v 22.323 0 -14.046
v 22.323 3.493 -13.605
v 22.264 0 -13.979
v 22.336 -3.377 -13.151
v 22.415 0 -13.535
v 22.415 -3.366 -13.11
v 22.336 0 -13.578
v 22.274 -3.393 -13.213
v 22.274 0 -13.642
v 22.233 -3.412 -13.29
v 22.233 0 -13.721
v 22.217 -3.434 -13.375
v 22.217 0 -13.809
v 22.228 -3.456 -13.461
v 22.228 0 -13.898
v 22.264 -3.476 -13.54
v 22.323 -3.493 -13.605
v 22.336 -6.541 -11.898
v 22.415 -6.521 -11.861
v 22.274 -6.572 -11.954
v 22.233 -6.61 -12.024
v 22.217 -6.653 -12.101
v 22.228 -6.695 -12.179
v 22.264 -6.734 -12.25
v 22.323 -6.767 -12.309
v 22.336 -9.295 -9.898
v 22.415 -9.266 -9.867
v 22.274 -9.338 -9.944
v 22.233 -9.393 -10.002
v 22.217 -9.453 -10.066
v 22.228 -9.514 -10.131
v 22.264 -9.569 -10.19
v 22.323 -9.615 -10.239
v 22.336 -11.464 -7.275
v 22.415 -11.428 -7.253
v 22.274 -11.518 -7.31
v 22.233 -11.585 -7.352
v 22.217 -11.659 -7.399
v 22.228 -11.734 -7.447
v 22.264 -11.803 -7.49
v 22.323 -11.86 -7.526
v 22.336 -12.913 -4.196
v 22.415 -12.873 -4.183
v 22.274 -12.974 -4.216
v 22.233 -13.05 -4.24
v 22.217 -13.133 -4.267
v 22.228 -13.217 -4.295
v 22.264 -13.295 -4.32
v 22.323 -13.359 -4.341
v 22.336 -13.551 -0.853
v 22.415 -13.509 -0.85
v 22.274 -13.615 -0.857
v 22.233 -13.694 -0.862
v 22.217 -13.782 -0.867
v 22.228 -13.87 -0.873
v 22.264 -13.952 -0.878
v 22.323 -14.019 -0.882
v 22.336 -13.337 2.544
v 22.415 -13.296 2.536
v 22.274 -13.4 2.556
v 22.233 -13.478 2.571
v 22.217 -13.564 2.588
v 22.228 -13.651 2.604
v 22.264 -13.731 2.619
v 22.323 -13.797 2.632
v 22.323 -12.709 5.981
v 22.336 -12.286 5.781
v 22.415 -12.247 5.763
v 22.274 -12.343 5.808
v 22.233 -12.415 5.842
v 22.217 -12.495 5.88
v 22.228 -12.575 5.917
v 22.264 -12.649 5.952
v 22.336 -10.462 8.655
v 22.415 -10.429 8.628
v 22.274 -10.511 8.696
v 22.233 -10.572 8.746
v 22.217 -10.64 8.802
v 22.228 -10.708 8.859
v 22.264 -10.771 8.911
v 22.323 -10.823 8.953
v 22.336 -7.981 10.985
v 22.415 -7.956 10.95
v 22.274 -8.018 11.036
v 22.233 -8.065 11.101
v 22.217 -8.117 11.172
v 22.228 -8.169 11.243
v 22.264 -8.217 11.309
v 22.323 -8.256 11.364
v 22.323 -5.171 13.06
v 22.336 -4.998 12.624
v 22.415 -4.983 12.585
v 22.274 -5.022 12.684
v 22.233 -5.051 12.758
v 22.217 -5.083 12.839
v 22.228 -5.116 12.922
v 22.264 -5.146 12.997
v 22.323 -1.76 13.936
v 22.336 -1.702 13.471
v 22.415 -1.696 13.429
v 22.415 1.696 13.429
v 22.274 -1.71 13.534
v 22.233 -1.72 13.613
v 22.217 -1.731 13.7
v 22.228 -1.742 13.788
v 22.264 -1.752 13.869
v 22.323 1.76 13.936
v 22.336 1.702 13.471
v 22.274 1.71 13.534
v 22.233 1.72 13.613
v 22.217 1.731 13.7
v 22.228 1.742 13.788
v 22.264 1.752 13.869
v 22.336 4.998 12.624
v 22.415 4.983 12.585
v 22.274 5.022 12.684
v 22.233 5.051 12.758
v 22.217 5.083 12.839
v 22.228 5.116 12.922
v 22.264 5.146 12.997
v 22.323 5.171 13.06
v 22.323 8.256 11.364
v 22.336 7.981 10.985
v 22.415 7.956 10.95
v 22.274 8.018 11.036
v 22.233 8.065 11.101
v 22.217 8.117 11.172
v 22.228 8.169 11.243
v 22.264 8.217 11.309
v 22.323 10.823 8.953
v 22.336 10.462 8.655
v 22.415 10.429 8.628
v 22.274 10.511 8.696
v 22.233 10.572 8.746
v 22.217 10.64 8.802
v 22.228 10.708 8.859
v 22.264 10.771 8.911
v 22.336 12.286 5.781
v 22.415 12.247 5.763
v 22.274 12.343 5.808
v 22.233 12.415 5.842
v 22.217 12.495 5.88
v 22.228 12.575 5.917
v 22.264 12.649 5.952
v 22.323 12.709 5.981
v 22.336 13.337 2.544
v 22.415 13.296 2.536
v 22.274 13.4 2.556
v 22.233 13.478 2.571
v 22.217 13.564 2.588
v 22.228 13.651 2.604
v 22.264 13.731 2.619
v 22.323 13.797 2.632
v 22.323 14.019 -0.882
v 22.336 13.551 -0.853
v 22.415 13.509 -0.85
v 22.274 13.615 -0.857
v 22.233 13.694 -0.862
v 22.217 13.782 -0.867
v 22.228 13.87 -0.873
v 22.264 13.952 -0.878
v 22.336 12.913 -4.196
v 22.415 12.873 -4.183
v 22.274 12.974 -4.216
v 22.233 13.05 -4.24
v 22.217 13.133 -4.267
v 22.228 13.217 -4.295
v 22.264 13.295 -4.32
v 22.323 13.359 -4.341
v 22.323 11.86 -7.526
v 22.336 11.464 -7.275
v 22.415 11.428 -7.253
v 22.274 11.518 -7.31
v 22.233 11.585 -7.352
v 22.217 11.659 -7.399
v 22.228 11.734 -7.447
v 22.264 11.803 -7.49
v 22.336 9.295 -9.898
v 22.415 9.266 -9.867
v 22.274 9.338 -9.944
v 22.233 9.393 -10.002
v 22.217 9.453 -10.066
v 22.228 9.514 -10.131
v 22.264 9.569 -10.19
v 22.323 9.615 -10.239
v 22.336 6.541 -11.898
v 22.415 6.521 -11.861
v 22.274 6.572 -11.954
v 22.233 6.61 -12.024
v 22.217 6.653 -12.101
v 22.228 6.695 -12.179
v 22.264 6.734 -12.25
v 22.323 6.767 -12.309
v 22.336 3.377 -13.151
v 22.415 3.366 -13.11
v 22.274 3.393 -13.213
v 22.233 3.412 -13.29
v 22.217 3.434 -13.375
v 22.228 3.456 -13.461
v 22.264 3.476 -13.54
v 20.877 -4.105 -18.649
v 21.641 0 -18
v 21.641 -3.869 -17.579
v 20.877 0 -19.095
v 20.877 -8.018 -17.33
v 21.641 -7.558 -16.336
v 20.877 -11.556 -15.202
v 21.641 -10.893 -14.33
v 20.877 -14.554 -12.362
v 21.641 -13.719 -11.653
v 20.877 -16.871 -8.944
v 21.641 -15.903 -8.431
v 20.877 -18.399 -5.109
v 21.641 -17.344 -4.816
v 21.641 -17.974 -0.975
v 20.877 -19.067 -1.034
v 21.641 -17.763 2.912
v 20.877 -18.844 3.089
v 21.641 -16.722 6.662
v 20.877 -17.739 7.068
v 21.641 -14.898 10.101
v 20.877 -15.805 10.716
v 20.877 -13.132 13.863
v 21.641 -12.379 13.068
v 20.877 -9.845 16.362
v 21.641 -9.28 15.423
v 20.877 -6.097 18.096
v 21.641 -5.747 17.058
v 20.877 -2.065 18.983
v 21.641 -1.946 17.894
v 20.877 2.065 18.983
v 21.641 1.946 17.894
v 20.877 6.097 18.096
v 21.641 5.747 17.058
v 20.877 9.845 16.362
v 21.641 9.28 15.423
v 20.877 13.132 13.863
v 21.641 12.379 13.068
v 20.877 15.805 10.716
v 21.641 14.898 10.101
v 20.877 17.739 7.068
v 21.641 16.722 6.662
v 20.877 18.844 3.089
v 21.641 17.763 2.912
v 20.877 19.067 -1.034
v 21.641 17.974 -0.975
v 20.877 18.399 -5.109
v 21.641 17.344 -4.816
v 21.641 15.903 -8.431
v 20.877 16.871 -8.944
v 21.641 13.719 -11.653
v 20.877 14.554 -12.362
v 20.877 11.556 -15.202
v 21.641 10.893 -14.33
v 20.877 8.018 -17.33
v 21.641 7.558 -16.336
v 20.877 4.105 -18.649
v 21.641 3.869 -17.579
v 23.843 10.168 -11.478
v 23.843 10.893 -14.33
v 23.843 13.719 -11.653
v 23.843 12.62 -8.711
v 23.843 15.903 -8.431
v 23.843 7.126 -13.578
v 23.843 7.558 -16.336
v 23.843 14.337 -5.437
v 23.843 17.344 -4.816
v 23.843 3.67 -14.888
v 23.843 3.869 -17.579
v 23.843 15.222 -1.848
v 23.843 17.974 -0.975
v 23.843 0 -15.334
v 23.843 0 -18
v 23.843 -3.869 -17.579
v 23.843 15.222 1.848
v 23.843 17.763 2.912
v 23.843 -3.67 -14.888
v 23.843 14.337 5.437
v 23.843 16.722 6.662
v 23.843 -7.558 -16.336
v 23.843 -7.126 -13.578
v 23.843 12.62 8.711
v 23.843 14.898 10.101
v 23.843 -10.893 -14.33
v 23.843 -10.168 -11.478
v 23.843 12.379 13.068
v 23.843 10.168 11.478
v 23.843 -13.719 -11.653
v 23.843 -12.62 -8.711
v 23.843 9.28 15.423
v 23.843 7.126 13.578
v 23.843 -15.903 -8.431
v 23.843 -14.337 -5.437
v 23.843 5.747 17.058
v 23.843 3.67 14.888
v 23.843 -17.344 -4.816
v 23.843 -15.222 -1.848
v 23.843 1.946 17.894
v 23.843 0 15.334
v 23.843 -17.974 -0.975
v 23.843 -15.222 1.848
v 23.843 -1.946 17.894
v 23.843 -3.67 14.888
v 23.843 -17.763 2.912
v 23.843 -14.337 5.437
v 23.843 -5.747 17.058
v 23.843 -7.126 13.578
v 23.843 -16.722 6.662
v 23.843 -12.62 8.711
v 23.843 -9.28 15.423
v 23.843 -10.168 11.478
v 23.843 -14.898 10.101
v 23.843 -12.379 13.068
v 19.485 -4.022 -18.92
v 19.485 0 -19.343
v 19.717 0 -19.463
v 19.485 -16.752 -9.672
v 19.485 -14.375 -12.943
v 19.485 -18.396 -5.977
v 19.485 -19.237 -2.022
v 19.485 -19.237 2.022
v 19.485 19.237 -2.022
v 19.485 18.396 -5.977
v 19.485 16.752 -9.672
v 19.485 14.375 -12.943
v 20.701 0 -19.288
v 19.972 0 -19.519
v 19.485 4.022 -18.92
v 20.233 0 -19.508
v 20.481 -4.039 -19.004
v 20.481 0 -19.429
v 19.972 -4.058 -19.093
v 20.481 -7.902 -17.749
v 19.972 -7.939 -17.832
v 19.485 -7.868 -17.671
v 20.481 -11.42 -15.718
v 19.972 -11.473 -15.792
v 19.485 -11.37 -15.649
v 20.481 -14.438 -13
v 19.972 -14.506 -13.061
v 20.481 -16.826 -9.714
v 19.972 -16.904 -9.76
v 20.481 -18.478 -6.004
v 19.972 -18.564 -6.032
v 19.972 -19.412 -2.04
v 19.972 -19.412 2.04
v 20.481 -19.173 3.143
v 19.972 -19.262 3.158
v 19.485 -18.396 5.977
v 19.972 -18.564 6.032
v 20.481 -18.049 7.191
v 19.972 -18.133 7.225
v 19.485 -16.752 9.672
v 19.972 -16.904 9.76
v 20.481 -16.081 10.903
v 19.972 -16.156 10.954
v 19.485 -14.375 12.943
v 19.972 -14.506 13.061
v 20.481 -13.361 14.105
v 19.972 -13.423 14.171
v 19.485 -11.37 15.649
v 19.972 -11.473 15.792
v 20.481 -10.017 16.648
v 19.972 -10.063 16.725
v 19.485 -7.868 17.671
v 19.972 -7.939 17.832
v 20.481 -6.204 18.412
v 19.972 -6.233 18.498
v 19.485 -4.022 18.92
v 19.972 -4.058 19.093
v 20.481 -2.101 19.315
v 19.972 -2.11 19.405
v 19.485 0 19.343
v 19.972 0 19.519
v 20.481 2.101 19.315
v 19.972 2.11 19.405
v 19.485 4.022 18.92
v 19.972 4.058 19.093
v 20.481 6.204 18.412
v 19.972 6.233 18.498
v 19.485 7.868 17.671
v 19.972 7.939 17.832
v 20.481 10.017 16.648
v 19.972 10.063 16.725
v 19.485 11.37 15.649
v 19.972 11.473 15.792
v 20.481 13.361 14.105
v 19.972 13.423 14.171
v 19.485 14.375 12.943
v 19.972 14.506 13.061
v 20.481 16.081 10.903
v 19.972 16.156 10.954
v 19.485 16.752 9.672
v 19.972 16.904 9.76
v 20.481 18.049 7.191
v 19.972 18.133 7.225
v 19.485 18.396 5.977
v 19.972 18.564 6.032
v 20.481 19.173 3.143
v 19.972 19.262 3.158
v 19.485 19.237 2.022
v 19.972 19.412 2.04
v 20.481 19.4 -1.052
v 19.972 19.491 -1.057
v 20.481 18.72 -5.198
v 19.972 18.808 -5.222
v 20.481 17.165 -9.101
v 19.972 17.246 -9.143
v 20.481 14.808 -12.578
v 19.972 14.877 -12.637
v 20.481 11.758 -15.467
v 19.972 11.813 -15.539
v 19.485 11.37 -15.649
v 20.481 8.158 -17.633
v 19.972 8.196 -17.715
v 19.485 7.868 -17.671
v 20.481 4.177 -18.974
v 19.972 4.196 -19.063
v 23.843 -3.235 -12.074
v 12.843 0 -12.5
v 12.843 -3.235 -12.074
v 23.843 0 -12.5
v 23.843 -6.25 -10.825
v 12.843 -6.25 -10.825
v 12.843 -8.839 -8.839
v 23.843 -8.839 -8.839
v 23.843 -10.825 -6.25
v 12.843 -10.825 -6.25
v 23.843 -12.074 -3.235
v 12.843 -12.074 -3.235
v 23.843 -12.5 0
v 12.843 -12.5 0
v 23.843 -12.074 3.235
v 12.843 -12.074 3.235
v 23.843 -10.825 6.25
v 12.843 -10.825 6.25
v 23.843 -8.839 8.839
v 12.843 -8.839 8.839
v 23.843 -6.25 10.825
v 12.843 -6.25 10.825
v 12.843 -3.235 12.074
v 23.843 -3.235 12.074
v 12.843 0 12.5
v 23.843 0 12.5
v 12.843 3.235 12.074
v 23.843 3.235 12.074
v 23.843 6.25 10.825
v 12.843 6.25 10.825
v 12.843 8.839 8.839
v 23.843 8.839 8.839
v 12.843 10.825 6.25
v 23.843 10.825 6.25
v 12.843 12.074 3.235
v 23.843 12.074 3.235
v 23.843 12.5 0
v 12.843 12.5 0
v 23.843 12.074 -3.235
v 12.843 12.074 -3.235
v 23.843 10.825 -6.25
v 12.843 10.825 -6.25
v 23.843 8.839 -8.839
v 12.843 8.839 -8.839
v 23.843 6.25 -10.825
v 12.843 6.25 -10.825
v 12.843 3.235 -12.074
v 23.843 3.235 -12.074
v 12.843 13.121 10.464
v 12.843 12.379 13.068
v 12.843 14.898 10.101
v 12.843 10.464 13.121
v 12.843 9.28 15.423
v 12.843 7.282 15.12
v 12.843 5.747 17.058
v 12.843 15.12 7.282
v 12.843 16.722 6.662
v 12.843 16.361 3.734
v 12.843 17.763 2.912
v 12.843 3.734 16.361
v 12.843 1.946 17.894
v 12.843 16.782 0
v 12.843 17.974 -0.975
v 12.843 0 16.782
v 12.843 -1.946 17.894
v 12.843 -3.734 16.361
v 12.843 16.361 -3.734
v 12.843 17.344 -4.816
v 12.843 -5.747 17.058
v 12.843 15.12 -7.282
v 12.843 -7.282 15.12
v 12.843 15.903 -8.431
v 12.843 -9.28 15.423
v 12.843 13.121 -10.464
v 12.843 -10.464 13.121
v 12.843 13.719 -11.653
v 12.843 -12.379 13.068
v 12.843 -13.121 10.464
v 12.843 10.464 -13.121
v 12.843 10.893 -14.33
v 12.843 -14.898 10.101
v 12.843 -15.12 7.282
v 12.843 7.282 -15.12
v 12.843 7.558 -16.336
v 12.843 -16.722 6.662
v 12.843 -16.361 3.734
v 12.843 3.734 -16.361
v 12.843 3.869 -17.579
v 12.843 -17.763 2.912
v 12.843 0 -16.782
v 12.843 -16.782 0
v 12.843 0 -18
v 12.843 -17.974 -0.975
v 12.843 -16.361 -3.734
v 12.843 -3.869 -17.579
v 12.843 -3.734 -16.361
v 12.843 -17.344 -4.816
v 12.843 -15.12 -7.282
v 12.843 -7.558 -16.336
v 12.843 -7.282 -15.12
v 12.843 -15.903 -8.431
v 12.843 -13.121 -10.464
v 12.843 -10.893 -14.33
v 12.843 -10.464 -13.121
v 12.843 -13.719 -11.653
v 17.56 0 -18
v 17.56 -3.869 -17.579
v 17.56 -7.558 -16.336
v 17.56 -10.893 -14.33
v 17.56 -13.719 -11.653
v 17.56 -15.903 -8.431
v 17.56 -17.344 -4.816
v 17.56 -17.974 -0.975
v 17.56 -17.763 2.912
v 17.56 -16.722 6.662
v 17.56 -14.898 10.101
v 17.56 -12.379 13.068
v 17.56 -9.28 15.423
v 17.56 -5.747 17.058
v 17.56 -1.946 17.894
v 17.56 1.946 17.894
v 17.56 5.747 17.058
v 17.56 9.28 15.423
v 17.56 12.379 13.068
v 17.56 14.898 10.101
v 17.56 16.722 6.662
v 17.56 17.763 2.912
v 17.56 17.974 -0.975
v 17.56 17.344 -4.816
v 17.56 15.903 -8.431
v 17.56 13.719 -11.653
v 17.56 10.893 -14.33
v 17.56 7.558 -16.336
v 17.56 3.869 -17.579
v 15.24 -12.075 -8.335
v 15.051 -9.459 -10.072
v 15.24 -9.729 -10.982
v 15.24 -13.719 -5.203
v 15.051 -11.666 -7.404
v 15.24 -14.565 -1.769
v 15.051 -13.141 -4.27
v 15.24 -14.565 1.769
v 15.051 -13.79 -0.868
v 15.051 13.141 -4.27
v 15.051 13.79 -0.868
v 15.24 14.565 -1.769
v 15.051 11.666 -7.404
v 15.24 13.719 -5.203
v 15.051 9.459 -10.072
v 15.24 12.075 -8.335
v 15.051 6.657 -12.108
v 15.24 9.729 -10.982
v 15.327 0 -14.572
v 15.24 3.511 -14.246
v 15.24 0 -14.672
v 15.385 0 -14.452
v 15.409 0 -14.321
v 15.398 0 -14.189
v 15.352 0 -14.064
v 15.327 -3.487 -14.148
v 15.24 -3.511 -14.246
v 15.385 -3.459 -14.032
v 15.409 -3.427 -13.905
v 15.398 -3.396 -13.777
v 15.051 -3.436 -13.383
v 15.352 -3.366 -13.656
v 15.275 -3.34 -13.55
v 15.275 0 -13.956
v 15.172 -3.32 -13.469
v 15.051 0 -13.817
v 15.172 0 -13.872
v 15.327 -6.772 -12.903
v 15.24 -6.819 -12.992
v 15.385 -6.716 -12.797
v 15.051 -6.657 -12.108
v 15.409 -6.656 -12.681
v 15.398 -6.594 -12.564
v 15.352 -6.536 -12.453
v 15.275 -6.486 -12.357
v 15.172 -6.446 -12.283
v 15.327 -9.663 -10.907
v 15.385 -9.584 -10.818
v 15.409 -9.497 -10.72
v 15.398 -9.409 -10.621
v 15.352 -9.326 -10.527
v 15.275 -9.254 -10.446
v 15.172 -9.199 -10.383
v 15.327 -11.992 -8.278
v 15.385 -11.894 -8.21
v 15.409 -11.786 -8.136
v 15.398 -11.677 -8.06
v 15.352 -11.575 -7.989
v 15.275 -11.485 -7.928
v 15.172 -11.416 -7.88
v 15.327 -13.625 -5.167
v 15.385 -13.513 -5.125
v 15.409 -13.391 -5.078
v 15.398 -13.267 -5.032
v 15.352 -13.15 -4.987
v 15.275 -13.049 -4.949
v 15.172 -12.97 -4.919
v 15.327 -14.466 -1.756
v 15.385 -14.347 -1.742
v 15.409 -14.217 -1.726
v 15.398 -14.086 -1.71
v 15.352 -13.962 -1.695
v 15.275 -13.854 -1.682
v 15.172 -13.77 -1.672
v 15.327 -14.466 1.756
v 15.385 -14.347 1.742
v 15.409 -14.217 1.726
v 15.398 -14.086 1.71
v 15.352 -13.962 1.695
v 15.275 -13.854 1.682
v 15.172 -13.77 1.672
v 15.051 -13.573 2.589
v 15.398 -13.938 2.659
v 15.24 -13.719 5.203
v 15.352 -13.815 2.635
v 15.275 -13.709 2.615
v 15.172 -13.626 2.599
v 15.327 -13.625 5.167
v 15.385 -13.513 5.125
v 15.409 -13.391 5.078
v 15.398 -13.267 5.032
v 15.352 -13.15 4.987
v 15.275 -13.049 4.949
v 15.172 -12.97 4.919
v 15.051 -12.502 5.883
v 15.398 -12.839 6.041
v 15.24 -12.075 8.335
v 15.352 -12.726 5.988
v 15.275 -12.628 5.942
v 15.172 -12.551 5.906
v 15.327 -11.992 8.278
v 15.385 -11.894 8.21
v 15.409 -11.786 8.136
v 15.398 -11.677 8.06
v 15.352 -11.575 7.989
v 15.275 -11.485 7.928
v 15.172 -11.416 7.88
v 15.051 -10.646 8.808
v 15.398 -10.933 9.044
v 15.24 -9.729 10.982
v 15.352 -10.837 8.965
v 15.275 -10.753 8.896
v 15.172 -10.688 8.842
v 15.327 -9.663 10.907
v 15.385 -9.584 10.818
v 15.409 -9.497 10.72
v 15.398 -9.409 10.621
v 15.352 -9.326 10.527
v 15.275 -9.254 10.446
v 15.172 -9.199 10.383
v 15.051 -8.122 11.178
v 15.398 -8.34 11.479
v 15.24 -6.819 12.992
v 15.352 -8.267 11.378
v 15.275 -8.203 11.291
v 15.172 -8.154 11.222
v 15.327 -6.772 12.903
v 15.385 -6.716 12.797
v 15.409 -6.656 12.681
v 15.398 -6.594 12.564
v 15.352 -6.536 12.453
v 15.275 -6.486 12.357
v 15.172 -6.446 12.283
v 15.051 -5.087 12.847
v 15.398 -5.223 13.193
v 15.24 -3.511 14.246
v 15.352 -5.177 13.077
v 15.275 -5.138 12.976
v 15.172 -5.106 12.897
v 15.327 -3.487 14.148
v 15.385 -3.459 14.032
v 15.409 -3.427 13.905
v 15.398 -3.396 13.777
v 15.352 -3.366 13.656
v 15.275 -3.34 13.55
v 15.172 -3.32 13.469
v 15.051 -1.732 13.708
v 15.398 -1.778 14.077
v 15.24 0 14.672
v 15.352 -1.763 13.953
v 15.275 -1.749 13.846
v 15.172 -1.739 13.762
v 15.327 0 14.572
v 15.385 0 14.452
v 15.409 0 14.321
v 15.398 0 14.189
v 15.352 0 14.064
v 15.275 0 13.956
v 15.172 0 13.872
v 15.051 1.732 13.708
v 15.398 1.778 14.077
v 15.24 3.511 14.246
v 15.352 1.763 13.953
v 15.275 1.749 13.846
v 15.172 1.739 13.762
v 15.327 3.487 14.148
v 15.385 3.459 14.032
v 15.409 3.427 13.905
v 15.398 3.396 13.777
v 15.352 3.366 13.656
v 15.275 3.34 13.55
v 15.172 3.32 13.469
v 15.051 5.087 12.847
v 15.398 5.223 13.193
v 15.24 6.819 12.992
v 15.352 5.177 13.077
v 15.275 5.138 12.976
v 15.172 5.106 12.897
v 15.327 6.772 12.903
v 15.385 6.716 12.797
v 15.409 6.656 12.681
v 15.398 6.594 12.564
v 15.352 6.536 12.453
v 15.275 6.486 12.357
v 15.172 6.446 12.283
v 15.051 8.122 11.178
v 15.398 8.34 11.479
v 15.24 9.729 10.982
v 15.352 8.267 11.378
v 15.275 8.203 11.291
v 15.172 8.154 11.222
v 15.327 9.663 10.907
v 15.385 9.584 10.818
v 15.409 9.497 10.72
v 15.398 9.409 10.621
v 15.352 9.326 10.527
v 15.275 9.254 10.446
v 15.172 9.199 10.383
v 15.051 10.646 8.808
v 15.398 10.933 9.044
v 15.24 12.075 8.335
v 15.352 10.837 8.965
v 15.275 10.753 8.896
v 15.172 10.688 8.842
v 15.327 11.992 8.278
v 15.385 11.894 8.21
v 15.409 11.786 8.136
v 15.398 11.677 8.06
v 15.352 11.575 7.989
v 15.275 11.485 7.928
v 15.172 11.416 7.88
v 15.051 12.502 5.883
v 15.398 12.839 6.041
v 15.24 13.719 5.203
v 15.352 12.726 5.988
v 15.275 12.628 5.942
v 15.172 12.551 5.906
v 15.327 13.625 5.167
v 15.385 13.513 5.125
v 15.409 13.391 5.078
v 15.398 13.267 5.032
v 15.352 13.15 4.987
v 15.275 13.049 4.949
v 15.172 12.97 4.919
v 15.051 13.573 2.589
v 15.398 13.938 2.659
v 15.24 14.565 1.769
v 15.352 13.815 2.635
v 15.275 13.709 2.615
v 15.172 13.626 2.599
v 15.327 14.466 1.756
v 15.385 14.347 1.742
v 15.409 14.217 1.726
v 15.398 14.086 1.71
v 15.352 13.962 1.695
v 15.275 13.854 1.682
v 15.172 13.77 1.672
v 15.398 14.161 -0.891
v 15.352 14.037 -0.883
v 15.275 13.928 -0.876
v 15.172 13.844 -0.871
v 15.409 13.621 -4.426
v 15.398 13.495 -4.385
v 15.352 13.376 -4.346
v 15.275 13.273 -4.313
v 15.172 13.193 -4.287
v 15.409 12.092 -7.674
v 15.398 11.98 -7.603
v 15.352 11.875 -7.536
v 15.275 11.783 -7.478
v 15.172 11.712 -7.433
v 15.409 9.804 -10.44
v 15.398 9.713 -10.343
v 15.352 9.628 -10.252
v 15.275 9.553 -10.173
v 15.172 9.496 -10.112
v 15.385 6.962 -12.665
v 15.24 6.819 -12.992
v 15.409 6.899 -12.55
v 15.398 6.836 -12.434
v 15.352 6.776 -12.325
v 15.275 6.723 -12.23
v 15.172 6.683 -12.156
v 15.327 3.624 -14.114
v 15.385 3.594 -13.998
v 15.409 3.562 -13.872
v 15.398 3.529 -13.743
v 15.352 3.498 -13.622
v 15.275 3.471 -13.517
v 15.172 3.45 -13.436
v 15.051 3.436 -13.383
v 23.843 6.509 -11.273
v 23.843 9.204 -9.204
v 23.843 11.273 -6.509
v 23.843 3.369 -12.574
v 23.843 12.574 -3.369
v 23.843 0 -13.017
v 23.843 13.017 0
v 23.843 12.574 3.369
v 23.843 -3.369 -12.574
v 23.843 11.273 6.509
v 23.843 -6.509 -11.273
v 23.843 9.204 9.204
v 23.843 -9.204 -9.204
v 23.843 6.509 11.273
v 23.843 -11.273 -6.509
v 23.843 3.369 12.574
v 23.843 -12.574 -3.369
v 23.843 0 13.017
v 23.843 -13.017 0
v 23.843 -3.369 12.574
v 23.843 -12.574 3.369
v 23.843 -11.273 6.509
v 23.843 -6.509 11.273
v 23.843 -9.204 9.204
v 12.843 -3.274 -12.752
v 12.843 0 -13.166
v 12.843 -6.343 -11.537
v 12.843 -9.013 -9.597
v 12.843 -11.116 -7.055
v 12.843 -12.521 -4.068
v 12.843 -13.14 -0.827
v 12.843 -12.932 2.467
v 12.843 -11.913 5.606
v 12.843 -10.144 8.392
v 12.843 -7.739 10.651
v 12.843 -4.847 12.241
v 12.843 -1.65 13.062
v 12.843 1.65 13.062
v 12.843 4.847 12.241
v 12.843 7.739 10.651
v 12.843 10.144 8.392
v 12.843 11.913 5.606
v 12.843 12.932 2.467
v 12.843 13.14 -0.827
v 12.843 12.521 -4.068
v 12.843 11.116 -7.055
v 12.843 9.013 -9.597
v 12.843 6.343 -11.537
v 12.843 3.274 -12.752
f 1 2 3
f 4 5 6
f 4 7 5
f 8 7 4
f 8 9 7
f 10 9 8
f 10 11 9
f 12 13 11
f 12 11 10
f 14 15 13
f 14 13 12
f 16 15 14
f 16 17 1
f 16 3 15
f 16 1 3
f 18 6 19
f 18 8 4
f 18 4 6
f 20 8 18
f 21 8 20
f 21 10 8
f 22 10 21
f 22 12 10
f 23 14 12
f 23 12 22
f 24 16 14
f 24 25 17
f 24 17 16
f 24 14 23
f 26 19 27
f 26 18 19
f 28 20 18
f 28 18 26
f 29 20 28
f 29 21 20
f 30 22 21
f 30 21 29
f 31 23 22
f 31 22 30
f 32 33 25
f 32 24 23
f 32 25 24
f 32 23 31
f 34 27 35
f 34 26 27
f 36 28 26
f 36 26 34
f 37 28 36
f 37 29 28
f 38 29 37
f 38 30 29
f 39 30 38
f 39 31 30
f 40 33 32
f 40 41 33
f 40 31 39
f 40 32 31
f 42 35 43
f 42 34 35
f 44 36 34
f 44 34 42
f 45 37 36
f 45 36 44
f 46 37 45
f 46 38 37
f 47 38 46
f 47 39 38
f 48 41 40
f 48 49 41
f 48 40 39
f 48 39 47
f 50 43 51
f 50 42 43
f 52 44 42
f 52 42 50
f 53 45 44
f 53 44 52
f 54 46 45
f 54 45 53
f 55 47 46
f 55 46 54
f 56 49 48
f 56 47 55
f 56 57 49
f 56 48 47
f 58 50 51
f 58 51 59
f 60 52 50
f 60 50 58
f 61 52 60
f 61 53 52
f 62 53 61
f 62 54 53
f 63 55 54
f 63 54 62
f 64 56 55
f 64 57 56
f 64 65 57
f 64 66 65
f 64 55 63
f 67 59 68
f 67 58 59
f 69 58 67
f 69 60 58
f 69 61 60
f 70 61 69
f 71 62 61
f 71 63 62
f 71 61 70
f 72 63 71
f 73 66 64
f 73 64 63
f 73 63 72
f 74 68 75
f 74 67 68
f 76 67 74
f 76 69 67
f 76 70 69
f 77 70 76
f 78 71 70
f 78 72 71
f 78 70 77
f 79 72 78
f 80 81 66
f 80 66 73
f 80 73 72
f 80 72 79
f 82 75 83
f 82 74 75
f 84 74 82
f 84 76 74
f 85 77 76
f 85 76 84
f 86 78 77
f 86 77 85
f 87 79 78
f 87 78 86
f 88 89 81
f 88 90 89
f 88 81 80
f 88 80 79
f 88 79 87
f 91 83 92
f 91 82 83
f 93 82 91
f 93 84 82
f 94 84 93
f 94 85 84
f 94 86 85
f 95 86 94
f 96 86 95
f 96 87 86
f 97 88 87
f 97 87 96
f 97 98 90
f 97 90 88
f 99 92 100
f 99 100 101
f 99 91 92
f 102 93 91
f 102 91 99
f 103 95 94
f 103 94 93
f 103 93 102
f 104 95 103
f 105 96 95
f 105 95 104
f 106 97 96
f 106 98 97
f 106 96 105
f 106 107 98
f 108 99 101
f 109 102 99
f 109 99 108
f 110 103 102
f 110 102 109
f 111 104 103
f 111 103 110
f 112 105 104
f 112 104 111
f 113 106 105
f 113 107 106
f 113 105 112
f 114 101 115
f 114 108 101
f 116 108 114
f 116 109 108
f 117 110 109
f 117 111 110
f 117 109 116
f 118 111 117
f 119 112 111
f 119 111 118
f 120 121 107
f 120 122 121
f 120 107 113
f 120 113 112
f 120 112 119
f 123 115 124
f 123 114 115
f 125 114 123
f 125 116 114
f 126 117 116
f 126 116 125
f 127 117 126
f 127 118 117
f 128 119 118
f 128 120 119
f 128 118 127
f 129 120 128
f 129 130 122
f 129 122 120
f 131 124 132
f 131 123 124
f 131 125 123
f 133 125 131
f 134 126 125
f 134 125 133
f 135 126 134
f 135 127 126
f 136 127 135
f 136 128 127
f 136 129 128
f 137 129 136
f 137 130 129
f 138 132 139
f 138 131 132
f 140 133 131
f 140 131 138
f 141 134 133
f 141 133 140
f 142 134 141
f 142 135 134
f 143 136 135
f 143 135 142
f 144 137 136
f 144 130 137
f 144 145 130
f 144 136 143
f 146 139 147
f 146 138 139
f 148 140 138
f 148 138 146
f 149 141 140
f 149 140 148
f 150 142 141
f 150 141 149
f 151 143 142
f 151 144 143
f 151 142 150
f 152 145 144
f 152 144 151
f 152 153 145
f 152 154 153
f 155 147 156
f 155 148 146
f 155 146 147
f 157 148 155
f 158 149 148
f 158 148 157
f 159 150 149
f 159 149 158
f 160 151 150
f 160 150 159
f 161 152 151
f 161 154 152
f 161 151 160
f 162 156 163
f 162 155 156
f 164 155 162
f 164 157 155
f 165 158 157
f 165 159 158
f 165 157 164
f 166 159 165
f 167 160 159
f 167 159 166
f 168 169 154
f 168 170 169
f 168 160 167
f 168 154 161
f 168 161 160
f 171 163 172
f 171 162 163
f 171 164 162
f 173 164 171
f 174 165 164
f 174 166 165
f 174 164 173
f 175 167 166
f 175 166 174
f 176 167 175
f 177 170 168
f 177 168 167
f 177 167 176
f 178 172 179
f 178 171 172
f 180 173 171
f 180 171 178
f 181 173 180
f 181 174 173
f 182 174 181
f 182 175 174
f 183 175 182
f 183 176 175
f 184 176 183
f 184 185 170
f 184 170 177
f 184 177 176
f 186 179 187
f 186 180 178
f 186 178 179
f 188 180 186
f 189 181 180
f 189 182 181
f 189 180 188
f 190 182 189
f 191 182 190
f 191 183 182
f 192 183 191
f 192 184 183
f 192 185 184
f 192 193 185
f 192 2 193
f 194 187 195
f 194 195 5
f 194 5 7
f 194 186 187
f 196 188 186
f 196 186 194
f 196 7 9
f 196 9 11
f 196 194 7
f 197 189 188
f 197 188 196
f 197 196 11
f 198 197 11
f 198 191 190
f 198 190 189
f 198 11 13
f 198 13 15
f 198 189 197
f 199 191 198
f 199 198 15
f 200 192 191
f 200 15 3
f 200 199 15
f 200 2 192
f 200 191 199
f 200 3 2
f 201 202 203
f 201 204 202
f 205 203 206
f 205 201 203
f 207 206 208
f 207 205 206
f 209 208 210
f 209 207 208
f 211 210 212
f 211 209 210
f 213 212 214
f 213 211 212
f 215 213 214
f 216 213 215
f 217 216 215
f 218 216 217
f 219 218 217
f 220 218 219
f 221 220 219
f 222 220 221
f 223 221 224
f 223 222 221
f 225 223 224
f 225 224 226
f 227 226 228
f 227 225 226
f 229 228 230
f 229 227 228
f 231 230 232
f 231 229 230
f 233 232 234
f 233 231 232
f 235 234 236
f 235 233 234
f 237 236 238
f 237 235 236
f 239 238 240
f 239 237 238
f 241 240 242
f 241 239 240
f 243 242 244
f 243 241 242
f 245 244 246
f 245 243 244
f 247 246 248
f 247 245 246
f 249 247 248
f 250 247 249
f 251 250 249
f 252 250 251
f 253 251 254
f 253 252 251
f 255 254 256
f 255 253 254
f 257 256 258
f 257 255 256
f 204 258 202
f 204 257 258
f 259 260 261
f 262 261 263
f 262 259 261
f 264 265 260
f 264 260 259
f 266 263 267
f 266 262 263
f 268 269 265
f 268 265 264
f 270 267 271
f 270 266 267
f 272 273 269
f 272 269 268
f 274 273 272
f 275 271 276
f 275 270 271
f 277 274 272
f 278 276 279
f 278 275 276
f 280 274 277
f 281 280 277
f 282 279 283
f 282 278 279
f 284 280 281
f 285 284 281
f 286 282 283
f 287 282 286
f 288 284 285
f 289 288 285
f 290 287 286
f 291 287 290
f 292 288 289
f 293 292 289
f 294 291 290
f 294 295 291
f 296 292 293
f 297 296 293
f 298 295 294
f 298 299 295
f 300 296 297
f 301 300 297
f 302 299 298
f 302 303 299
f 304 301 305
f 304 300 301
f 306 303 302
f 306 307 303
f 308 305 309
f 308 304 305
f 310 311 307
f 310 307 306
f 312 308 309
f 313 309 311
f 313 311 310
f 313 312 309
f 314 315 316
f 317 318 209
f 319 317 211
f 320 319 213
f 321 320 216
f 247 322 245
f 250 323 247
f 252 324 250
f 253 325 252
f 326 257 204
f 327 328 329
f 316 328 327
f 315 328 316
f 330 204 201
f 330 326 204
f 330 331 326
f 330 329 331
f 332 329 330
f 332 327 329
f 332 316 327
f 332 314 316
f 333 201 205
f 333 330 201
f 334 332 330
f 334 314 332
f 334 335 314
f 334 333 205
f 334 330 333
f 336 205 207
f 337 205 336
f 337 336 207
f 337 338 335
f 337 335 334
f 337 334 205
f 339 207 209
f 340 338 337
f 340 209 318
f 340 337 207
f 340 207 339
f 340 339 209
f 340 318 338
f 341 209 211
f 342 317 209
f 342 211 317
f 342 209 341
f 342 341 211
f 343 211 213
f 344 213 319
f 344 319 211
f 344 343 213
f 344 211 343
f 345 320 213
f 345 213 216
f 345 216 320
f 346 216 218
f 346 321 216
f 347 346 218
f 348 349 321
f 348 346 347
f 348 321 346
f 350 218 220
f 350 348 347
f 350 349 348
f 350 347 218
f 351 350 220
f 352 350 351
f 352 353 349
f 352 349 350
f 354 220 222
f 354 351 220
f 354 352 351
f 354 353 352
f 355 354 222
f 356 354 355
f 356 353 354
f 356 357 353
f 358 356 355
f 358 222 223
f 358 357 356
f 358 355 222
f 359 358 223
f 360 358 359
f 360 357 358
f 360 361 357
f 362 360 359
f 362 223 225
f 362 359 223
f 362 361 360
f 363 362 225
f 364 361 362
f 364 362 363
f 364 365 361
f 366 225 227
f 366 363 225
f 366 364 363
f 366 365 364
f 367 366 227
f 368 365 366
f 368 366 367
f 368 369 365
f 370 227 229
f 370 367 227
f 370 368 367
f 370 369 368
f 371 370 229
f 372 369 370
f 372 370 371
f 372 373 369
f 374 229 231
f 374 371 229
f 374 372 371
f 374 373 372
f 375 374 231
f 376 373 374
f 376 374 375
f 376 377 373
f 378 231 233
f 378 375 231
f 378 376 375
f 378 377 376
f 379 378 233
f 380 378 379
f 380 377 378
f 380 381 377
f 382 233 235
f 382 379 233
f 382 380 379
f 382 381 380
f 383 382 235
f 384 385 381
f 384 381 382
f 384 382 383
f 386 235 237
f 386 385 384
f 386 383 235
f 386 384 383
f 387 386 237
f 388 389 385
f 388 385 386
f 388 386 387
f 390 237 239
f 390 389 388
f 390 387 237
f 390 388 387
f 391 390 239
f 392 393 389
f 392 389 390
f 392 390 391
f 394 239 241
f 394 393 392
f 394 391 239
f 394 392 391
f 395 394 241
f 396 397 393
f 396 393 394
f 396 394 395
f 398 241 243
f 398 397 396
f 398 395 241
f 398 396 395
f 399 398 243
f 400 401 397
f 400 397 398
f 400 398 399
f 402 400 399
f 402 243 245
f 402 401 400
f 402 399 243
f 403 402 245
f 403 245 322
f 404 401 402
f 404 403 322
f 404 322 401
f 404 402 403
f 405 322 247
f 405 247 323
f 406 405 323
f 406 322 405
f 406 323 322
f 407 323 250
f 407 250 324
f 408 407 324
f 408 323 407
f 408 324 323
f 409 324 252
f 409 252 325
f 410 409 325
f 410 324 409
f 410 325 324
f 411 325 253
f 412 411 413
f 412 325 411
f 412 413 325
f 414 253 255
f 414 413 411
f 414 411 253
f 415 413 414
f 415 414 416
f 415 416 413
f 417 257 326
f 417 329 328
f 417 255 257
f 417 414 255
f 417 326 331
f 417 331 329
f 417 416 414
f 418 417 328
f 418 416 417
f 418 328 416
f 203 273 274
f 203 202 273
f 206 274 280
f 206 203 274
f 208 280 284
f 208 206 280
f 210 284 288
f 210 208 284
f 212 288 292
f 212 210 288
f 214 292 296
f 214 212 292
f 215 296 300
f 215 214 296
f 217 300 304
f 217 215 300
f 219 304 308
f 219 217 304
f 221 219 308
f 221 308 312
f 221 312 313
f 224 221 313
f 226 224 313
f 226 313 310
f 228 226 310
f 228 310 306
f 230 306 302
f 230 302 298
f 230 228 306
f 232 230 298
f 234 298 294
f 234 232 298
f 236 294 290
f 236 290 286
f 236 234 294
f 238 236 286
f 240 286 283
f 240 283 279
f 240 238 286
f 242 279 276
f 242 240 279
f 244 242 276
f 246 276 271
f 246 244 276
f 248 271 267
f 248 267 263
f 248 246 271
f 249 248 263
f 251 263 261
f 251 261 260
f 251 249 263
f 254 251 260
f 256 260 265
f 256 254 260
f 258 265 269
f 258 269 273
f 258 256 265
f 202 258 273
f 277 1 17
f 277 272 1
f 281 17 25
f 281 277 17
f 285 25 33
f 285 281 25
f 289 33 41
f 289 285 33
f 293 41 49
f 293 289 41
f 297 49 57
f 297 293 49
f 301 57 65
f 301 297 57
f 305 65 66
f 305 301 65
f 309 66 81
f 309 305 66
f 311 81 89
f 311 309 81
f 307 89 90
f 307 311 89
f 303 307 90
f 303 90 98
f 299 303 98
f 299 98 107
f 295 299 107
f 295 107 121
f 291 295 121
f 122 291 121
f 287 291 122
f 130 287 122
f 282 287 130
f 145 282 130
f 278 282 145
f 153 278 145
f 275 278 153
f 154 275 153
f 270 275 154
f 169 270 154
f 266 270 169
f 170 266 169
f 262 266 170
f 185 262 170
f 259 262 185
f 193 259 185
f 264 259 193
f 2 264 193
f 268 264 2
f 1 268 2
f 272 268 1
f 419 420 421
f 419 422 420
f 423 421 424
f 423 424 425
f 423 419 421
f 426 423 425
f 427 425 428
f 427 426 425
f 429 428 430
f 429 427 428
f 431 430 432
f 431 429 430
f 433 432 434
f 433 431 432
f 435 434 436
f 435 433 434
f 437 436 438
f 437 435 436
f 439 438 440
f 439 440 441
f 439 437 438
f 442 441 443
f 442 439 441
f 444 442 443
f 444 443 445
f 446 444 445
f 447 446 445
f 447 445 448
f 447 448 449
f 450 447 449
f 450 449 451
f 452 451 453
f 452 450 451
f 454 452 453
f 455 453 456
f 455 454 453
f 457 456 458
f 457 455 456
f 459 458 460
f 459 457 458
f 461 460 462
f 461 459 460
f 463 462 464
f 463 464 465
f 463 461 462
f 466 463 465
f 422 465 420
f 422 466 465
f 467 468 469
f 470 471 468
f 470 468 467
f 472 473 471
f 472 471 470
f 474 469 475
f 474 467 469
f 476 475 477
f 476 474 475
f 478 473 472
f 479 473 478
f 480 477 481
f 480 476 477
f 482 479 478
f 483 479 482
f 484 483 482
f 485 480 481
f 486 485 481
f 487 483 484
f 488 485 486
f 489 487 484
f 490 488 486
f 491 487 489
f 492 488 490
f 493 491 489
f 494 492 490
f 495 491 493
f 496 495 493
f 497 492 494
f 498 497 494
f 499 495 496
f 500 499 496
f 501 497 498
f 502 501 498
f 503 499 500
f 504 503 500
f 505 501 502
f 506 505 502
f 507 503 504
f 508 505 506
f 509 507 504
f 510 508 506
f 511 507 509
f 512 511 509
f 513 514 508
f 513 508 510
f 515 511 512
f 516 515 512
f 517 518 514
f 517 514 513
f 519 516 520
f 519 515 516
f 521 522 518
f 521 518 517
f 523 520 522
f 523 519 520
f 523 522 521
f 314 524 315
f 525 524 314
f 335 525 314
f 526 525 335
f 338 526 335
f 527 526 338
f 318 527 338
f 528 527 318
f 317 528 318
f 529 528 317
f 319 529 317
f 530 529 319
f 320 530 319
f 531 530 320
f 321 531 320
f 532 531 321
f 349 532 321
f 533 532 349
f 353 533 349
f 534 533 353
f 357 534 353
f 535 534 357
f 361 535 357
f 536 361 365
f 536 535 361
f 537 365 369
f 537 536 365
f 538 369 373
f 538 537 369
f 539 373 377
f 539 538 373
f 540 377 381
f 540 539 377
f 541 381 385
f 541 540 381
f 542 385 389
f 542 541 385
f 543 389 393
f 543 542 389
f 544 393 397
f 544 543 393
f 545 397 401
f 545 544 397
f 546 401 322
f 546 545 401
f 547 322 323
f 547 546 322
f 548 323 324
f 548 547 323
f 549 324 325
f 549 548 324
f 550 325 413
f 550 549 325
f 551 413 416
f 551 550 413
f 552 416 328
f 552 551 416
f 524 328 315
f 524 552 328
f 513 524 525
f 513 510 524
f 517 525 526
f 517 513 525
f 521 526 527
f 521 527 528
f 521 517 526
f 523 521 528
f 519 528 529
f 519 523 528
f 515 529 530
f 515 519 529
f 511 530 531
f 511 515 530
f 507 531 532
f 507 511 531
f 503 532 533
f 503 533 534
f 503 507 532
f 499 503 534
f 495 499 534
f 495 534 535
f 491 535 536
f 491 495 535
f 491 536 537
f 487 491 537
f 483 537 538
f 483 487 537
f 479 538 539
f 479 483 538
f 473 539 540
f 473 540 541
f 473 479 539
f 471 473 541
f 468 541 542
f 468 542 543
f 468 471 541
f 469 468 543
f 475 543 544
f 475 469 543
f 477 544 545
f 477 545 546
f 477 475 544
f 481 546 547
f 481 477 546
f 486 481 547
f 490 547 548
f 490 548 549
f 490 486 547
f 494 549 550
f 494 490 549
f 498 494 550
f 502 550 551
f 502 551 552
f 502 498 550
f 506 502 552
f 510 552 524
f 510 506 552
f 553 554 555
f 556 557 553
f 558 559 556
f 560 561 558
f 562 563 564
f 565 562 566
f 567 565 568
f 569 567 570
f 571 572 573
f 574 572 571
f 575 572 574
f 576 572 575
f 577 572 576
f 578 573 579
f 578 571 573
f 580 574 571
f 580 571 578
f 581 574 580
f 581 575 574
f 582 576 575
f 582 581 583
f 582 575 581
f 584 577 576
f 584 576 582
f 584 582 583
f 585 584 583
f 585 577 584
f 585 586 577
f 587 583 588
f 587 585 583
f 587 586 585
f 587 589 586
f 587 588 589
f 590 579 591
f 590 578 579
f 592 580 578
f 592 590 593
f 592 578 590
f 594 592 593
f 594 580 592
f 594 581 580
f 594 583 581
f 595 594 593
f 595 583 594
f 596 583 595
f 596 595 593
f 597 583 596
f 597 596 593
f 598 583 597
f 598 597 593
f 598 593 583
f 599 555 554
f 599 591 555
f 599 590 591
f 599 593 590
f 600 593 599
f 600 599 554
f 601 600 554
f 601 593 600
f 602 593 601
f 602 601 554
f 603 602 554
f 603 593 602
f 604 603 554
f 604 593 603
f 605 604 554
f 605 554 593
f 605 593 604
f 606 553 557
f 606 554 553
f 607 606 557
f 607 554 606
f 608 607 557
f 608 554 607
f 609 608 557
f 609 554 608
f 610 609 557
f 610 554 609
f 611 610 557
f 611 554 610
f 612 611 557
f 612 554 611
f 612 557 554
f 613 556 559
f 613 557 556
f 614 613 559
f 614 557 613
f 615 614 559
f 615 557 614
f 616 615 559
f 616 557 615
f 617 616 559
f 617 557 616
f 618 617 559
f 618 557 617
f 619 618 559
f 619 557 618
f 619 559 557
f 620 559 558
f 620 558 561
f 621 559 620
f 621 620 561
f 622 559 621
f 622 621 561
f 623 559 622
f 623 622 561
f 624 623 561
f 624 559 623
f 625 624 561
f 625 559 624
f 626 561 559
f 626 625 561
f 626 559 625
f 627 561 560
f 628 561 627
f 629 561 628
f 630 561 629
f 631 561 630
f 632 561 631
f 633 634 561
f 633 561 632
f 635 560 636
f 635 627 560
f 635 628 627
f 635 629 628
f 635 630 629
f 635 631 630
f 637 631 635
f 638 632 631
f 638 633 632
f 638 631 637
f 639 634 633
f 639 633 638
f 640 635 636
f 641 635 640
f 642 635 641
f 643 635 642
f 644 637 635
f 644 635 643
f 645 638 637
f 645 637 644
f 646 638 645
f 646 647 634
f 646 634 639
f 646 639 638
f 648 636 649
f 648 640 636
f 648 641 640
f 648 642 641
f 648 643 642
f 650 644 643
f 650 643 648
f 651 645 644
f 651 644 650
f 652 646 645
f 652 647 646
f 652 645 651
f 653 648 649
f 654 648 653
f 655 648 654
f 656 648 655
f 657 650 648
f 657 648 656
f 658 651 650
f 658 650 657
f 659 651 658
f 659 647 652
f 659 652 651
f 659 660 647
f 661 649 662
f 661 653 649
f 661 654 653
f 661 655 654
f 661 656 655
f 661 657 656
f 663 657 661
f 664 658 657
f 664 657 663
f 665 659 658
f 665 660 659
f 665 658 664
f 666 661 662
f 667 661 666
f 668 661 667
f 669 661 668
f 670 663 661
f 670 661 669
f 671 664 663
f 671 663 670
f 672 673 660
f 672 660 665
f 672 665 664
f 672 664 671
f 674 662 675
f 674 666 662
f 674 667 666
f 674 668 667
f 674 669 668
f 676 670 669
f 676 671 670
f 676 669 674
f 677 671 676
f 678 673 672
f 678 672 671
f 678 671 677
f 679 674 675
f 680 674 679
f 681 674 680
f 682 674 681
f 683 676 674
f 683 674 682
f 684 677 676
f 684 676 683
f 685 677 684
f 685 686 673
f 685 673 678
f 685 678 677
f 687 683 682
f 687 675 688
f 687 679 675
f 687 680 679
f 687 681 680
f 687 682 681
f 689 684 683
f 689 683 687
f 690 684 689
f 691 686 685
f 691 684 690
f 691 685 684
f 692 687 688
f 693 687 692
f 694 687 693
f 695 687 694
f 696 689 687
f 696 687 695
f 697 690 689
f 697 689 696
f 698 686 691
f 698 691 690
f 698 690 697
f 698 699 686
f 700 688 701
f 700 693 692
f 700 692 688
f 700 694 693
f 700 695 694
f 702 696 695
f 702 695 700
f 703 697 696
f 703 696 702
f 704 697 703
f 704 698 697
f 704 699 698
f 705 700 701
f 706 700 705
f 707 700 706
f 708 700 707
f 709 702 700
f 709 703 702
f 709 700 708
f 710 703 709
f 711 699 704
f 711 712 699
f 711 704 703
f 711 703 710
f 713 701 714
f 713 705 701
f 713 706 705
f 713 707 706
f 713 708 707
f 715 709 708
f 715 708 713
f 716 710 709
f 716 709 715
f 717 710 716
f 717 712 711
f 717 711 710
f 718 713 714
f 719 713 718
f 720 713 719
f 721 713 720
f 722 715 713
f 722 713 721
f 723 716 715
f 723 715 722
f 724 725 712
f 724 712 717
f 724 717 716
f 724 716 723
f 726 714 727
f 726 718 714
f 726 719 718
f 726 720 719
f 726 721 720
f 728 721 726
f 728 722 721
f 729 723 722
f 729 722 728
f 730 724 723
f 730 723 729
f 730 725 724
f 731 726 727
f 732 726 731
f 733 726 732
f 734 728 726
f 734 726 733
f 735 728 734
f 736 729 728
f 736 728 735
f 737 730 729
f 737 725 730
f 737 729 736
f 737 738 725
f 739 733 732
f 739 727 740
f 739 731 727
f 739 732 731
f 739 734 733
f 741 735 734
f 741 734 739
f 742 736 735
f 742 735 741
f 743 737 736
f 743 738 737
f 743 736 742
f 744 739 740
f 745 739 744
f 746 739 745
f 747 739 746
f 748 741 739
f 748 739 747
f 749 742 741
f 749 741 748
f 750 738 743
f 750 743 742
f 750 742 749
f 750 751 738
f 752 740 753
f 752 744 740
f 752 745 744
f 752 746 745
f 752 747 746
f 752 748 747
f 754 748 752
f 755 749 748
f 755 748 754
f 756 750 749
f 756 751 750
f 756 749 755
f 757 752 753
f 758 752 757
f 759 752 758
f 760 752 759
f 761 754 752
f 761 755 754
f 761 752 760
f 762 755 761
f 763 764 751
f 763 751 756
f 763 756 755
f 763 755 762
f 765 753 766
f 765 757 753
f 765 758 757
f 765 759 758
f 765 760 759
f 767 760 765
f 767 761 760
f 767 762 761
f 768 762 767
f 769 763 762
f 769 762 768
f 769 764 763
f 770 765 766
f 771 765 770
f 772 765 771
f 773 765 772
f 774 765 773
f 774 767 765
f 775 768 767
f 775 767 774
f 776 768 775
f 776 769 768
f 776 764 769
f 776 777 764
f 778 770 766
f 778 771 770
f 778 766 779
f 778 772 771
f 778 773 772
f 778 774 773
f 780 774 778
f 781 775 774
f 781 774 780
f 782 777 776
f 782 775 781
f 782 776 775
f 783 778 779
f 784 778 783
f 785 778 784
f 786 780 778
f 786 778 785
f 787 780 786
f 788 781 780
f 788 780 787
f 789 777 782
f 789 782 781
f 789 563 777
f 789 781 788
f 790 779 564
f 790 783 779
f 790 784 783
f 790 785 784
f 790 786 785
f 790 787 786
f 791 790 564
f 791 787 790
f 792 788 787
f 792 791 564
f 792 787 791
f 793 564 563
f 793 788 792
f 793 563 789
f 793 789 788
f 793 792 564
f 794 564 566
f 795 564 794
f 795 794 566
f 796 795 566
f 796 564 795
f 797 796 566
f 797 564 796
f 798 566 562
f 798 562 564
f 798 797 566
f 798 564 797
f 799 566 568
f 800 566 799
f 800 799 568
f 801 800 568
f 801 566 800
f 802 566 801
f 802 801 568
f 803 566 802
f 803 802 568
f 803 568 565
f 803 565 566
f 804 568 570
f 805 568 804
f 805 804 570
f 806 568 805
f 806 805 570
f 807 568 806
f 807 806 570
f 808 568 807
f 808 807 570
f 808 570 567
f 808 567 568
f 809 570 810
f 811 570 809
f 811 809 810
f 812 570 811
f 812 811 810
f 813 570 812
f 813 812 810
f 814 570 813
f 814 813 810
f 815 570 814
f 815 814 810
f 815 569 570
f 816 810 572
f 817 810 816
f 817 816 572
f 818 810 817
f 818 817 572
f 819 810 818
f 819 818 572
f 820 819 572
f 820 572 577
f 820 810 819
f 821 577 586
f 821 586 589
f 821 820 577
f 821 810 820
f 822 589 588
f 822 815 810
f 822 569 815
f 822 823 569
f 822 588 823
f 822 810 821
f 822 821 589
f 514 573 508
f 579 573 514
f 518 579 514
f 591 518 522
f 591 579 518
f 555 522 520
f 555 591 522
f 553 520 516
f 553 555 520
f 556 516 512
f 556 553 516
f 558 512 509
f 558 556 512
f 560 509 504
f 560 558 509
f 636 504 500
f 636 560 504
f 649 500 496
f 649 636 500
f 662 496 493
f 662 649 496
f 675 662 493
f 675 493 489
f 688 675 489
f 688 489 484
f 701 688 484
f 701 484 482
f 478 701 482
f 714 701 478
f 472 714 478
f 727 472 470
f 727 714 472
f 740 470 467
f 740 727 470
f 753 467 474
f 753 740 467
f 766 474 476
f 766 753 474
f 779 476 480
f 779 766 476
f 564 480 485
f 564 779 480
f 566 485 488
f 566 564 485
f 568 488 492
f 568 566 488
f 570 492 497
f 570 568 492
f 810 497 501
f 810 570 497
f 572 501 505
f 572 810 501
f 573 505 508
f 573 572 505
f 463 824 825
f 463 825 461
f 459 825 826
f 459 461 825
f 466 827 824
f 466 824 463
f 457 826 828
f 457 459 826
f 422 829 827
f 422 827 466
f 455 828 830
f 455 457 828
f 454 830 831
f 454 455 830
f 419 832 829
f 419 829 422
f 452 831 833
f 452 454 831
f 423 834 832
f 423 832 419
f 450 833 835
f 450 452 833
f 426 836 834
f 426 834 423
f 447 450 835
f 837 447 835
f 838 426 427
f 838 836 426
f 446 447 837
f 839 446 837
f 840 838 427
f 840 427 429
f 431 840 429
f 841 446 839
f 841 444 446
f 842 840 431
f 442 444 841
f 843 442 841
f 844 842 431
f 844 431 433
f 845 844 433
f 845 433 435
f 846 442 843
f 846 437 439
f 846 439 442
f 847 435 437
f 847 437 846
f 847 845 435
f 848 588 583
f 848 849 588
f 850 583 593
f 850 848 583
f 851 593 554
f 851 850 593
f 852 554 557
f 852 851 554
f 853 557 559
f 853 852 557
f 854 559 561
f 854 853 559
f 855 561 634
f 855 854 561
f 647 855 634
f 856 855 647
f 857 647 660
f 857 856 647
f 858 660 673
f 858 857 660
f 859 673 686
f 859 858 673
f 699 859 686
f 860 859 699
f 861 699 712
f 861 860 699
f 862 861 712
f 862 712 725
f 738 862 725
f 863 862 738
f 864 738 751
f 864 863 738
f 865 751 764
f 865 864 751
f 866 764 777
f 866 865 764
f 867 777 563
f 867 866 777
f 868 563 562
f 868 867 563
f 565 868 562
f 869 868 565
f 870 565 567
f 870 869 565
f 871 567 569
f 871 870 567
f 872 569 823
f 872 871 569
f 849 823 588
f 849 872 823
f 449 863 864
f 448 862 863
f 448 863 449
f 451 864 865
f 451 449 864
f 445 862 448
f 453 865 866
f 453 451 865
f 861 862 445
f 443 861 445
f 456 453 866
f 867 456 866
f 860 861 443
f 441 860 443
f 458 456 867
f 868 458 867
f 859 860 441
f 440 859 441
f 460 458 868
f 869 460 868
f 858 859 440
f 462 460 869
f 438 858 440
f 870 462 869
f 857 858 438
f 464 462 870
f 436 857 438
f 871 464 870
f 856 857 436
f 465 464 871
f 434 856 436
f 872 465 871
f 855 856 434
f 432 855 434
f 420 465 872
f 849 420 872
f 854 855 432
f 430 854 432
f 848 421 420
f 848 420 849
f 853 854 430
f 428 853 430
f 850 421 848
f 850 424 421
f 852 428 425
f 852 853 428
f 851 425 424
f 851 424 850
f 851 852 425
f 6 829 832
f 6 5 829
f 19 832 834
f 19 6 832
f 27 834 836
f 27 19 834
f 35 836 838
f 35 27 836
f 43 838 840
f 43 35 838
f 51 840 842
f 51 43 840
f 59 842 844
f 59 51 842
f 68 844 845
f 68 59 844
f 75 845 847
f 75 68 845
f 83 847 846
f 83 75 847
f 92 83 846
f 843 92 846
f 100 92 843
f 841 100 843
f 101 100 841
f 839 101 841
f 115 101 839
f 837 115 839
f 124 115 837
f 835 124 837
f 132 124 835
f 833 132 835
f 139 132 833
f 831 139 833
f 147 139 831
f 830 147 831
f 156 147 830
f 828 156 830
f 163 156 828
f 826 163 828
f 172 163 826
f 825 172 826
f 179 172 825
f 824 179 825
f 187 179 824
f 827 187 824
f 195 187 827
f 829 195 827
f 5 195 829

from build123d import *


with BuildPart() as part:
    # Croquis1 → Revolución1 (revolve)
    with BuildSketch(Plane.XY, mode=Mode.PRIVATE) as revoluci_n1_sk:
        with BuildLine():
            Line((23.843190864, 18), (21.641499939, 18))
            Line((21.641499939, 18), (20.877394398, 19.095222917))
            ThreePointArc((20.877394398, 19.095222917), (20.232592167, 19.507553513), (19.485086377, 19.343171243))
            Line((19.485086377, 19.343171243), (17.559865516, 18))
            Line((17.559865516, 18), (12.843190864, 18))
            Line((12.843190864, 18), (12.843190864, 16.782184677))
            Line((12.843190864, 16.782184677), (15.239734897, 14.672192861))
            ThreePointArc((15.239734897, 14.672192861), (15.397557992, 14.189058917), (15.050891885, 13.817374713))
            Line((15.050891885, 13.817374713), (12.843190864, 13.165654901))
            Line((12.843190864, 13.165654901), (12.843190864, 12.5))
            Line((12.843190864, 12.5), (23.843190864, 12.5))
            Line((23.843190864, 12.5), (23.843190864, 13.017083416))
            Line((23.843190864, 13.017083416), (22.414504066, 13.535357634))
            ThreePointArc((22.414504066, 13.535357634), (22.221515959, 13.764442451), (22.32291652, 14.046297359))
            Line((22.32291652, 14.046297359), (23.843190864, 15.333938712))
            Line((23.843190864, 15.333938712), (23.843190864, 18))
        make_face()
    revolve(revoluci_n1_sk.sketch.rotate(Axis((29.11578235, 0, 0), (-1, 0, 0)), 90), axis=Axis((29.11578235, 0, 0), (-1, 0, 0)))


solid = part.part
